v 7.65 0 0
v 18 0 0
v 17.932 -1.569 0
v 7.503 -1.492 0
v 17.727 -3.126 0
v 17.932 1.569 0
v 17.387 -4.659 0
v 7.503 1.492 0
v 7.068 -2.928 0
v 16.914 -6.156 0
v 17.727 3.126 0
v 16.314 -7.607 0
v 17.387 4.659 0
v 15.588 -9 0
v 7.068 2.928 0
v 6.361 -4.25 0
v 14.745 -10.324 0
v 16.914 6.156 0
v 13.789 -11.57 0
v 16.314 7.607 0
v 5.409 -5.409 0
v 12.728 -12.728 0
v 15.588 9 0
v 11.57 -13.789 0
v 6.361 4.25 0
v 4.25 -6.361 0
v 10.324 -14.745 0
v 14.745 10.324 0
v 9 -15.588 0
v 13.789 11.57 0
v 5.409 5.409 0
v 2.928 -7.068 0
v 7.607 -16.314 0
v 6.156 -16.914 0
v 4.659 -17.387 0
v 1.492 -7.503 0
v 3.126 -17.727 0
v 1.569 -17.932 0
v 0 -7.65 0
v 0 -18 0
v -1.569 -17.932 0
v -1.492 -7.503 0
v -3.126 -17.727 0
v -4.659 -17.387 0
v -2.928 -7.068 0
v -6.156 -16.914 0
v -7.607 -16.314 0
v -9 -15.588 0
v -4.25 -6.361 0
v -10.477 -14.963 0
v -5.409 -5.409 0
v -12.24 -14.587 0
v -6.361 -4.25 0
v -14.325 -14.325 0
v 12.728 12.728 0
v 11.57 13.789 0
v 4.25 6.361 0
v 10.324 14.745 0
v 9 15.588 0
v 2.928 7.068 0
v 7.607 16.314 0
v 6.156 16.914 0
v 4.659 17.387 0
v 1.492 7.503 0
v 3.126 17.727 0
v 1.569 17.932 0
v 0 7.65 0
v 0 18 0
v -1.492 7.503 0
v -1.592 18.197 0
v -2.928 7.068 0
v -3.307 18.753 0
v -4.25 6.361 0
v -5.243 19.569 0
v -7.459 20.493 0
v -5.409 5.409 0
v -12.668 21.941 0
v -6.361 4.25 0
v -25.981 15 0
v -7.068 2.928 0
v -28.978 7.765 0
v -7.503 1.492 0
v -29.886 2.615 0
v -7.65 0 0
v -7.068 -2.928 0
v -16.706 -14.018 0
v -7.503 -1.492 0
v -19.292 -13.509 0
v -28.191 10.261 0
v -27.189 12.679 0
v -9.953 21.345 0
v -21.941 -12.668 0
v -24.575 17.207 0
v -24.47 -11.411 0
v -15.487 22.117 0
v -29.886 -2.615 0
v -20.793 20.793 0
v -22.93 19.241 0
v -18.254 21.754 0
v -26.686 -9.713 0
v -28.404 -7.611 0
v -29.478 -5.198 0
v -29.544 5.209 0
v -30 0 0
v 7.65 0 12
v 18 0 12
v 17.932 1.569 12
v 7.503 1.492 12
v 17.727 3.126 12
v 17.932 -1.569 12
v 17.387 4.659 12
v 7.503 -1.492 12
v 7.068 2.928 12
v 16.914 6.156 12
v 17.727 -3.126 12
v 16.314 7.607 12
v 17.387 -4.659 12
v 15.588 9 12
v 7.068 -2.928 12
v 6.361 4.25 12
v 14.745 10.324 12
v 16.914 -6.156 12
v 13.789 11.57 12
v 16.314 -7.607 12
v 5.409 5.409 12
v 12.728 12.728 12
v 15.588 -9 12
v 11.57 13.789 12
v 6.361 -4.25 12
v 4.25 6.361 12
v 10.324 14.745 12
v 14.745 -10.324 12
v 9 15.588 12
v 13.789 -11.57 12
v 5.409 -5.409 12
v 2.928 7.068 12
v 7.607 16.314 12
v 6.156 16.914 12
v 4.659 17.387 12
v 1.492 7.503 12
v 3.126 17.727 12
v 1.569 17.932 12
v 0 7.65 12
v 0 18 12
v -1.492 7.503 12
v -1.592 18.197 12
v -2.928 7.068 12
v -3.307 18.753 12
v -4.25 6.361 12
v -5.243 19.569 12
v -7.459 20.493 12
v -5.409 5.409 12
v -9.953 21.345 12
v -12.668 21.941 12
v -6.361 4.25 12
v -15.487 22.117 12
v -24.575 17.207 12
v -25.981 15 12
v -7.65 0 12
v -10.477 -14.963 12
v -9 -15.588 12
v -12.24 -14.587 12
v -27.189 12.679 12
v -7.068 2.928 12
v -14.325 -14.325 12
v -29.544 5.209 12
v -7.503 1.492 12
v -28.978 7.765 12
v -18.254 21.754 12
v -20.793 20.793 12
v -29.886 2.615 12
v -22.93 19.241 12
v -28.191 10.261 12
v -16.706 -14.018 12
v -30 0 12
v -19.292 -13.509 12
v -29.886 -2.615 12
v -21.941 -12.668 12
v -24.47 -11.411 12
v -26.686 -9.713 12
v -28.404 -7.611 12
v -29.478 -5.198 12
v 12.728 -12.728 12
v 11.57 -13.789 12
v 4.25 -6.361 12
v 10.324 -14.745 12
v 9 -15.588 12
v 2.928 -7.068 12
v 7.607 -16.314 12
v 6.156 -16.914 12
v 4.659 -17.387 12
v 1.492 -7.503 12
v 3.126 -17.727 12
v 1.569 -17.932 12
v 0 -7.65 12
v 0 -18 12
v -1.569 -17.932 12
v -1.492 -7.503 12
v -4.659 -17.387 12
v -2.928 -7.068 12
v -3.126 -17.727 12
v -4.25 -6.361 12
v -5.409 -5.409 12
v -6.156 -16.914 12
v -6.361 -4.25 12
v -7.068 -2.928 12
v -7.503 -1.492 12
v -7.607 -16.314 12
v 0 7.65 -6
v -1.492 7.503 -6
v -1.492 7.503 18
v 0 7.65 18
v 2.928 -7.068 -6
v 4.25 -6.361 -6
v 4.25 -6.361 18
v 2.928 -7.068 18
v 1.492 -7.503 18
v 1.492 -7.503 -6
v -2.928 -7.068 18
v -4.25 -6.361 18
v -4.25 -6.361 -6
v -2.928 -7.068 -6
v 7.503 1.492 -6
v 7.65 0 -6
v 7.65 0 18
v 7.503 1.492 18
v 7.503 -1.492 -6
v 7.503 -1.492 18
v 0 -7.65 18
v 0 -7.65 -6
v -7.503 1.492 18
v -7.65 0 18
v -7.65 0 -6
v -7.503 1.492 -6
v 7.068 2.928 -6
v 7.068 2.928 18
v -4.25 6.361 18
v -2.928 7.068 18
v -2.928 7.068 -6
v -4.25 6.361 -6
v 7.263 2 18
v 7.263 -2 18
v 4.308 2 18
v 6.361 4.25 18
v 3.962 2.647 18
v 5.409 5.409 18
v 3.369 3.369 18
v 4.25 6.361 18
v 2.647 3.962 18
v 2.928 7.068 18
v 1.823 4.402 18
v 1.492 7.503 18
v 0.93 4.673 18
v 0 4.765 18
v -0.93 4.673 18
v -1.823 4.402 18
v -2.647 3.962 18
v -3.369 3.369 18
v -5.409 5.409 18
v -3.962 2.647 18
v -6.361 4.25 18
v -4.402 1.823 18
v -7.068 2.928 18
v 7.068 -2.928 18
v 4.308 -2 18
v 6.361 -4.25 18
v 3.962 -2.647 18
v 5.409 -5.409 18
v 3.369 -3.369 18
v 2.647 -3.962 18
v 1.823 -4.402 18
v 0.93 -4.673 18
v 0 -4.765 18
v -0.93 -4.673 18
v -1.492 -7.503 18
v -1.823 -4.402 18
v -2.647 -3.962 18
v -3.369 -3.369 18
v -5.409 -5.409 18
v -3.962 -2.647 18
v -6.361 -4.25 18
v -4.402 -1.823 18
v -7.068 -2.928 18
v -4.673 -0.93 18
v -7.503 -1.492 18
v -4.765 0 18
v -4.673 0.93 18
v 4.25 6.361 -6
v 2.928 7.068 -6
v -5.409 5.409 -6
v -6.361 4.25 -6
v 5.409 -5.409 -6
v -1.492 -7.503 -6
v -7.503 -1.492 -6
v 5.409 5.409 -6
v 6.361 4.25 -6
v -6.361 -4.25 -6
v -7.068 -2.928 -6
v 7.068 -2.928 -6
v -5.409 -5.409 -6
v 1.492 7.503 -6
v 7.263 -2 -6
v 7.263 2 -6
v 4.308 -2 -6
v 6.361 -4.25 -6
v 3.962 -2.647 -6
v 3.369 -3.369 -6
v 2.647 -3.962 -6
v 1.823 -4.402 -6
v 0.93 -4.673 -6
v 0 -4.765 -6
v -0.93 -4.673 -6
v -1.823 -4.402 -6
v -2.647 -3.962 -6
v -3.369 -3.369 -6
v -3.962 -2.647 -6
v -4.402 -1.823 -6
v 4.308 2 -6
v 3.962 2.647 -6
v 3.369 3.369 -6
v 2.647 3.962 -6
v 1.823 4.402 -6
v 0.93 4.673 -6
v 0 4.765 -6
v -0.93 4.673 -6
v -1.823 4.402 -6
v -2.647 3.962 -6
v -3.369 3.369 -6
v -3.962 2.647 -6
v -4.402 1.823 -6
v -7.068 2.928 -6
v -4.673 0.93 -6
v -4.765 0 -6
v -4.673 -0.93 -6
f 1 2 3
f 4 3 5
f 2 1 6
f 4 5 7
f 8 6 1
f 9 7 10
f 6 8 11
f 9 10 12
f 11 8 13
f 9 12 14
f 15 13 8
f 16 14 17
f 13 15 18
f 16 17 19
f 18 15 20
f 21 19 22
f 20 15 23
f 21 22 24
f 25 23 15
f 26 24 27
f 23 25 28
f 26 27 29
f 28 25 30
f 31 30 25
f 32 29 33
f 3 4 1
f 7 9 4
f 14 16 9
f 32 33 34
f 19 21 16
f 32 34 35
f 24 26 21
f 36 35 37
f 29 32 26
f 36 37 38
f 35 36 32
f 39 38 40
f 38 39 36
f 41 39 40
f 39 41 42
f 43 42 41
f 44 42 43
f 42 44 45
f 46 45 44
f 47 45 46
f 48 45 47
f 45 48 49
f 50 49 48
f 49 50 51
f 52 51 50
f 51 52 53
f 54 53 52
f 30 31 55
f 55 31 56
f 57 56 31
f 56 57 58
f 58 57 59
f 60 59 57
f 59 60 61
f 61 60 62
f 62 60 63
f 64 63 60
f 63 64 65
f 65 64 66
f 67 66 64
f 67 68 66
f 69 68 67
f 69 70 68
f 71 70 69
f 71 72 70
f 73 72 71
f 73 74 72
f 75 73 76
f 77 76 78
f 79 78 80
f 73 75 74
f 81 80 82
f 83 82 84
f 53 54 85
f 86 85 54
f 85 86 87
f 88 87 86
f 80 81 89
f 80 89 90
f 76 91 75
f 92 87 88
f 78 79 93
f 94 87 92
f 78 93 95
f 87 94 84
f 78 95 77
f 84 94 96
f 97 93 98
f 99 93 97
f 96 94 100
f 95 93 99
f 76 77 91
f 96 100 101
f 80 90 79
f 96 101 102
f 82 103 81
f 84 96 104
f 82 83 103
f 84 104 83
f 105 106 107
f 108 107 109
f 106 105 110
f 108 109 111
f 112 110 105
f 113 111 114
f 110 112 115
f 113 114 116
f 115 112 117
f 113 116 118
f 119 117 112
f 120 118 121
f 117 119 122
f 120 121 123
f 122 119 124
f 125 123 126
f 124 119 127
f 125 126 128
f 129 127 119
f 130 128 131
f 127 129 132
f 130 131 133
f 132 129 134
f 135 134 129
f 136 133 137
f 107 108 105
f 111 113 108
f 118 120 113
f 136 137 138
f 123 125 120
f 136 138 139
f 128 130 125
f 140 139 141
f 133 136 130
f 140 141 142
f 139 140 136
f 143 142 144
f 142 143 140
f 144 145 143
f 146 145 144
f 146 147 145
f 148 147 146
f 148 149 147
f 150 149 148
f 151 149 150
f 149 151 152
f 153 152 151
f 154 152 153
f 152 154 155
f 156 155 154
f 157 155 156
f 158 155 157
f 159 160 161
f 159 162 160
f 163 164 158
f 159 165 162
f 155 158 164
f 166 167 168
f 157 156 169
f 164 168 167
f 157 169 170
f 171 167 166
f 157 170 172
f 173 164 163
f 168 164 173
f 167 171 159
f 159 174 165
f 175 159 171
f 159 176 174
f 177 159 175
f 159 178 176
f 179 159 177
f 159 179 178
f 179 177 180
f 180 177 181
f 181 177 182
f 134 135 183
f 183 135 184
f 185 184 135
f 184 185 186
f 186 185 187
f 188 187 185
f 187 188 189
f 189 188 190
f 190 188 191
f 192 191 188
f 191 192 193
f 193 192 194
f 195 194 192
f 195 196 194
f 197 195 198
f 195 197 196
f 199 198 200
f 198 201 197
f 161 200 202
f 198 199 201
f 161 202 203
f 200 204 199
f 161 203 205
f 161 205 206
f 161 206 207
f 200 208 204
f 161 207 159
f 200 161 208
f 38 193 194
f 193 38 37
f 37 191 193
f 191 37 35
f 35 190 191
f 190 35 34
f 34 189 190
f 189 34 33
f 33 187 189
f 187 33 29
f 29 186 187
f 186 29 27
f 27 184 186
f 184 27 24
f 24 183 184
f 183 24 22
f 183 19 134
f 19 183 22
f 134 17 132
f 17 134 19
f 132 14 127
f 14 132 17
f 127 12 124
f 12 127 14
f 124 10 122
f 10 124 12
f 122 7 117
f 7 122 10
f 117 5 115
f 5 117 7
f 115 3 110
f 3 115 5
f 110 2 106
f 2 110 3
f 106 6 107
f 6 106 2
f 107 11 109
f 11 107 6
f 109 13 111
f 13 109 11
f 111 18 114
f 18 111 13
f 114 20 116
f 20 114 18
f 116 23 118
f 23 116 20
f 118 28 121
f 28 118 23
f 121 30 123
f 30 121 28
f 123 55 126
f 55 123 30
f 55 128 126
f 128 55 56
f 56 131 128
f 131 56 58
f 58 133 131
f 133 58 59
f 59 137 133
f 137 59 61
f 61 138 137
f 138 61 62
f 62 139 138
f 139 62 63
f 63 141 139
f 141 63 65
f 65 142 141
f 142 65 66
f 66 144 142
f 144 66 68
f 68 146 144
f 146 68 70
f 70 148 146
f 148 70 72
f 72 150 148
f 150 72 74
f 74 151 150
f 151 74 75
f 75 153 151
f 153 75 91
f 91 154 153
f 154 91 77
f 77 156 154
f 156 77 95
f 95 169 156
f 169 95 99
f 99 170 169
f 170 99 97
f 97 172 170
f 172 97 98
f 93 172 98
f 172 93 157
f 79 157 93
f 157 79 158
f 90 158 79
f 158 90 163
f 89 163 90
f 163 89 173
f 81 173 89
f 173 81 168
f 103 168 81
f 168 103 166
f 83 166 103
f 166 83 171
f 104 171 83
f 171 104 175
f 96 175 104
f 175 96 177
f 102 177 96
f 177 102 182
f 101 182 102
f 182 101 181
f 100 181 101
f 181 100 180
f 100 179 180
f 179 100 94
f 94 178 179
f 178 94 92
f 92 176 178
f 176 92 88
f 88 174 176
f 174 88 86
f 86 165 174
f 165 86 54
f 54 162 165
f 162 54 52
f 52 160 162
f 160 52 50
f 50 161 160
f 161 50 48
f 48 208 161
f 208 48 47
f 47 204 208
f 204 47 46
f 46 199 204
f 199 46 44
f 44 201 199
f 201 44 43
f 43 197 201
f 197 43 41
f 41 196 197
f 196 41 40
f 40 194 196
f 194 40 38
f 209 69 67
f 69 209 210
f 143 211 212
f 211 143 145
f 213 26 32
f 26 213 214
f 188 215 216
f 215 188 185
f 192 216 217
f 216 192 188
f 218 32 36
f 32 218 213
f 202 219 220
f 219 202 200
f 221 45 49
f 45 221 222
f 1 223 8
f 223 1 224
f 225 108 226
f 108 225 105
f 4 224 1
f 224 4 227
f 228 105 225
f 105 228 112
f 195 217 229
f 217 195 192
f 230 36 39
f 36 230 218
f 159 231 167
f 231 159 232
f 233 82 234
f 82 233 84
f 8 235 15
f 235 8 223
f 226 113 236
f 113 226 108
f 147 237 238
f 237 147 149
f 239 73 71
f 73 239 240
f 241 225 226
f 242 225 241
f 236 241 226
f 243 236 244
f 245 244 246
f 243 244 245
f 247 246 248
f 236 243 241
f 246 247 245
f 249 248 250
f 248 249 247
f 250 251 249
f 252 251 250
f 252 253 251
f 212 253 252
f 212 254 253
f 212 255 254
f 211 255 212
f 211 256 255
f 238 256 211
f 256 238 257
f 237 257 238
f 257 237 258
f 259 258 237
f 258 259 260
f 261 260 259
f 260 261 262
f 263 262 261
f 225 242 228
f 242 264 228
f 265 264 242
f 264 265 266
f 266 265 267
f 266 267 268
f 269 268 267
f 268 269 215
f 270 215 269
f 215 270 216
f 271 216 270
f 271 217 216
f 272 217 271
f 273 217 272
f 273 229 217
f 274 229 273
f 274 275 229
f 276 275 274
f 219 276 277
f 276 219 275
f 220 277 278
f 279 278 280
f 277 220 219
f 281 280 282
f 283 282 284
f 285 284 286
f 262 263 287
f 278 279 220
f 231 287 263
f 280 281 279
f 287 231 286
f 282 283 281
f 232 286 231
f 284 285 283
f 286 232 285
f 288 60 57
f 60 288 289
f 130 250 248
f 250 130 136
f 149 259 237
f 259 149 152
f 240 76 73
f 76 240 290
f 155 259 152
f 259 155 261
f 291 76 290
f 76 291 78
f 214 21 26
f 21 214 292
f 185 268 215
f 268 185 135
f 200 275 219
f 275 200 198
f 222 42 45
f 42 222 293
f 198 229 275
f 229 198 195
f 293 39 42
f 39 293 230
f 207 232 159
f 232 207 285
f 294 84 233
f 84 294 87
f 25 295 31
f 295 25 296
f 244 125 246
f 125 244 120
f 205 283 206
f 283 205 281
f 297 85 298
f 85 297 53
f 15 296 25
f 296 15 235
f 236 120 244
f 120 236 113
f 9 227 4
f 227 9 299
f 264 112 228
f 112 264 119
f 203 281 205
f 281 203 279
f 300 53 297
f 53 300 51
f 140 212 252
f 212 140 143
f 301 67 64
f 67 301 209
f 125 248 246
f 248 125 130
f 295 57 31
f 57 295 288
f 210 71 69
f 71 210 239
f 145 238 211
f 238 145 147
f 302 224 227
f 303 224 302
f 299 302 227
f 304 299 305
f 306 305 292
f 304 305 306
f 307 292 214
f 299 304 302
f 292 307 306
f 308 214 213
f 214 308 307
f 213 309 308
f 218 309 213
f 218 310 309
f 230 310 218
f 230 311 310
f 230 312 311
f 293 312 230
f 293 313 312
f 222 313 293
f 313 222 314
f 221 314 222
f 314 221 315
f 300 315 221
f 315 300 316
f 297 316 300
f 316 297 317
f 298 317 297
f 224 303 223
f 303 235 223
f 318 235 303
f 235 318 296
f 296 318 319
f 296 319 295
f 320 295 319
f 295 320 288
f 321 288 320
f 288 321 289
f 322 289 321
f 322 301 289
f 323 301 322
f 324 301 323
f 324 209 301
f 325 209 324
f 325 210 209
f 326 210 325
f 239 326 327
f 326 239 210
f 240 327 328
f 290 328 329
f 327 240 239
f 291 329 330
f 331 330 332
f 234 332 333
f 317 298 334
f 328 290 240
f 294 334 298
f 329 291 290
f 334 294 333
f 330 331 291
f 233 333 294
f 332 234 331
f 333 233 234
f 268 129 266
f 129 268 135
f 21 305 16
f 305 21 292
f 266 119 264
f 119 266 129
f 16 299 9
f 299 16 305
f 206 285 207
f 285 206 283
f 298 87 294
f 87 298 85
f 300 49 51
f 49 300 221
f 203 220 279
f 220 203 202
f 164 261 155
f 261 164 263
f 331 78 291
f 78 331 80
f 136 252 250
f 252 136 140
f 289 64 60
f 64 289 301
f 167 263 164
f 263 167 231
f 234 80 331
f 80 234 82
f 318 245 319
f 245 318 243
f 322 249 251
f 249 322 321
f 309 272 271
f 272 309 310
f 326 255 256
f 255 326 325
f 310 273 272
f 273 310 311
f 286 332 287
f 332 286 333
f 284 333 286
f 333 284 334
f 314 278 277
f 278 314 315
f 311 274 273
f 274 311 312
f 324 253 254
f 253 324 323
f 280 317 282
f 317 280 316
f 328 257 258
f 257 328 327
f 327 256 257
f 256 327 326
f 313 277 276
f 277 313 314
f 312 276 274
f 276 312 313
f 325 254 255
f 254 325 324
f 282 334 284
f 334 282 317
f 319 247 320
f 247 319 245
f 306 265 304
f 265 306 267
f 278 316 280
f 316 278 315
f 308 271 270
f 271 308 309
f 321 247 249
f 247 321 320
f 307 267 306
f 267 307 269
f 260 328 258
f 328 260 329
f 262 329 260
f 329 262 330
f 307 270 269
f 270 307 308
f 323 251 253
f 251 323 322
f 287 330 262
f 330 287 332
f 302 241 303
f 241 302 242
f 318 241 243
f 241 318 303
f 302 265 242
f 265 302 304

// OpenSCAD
$fn = 32;

// ----------------------------------------------------------------------
// Cam: base radius 18 mm with a 12 mm lift over 150 degrees
// ----------------------------------------------------------------------

// --- parameters (mm) ---
base_r = 18;              // base radius
lift = 12;                // lift height above the base radius
lift_span = 150;          // angular width of the lift
lift_start = 90;          // angle where the lift starts
cam_t = 12;               // cam plate thickness
hub_d = 15.3;             // hub diameter
hub_h = 24;               // hub height
bore_d = 9.53;            // bore
key_w = 4;                // keyway width
key_depth = 1.6;          // keyway depth

cam_profile = [[18, 0], [17.932, 1.569], [17.727, 3.126], [17.387, 4.659], [16.914, 6.156], [16.314, 7.607], [15.588, 9], [14.745, 10.324], [13.789, 11.57], [12.728, 12.728], [11.57, 13.789], [10.324, 14.745], [9, 15.588], [7.607, 16.314], [6.156, 16.914], [4.659, 17.387], [3.126, 17.727], [1.569, 17.932], [0, 18], [-1.592, 18.197], [-3.307, 18.753], [-5.243, 19.569], [-7.459, 20.493], [-9.953, 21.345], [-12.668, 21.941], [-15.487, 22.117], [-18.254, 21.754], [-20.793, 20.793], [-22.93, 19.241], [-24.575, 17.207], [-25.981, 15], [-27.189, 12.679], [-28.191, 10.261], [-28.978, 7.765], [-29.544, 5.209], [-29.886, 2.615], [-30, 0], [-29.886, -2.615], [-29.478, -5.198], [-28.404, -7.611], [-26.686, -9.713], [-24.47, -11.411], [-21.941, -12.668], [-19.292, -13.509], [-16.706, -14.018], [-14.325, -14.325], [-12.24, -14.587], [-10.477, -14.963], [-9, -15.588], [-7.607, -16.314], [-6.156, -16.914], [-4.659, -17.387], [-3.126, -17.727], [-1.569, -17.932], [0, -18], [1.569, -17.932], [3.126, -17.727], [4.659, -17.387], [6.156, -16.914], [7.607, -16.314], [9, -15.588], [10.324, -14.745], [11.57, -13.789], [12.728, -12.728], [13.789, -11.57], [14.745, -10.324], [15.588, -9], [16.314, -7.607], [16.914, -6.156], [17.387, -4.659], [17.727, -3.126], [17.932, -1.569]];

difference() {
  union() {
    linear_extrude(height = cam_t) polygon(cam_profile);
    /* hub, proud of the cam plate on both sides */
    translate([0, 0, -6]) cylinder(h = hub_h, d = hub_d);
  }
  /* bore through the hub, 2.5 mm clear on both faces */
  translate([0, 0, -8.5]) cylinder(h = hub_h + 5, d = bore_d);
  /* keyway, milled through the whole hub */
  translate([3.163, -2, -8.5]) cube([4.1, 4, 29]);
}
